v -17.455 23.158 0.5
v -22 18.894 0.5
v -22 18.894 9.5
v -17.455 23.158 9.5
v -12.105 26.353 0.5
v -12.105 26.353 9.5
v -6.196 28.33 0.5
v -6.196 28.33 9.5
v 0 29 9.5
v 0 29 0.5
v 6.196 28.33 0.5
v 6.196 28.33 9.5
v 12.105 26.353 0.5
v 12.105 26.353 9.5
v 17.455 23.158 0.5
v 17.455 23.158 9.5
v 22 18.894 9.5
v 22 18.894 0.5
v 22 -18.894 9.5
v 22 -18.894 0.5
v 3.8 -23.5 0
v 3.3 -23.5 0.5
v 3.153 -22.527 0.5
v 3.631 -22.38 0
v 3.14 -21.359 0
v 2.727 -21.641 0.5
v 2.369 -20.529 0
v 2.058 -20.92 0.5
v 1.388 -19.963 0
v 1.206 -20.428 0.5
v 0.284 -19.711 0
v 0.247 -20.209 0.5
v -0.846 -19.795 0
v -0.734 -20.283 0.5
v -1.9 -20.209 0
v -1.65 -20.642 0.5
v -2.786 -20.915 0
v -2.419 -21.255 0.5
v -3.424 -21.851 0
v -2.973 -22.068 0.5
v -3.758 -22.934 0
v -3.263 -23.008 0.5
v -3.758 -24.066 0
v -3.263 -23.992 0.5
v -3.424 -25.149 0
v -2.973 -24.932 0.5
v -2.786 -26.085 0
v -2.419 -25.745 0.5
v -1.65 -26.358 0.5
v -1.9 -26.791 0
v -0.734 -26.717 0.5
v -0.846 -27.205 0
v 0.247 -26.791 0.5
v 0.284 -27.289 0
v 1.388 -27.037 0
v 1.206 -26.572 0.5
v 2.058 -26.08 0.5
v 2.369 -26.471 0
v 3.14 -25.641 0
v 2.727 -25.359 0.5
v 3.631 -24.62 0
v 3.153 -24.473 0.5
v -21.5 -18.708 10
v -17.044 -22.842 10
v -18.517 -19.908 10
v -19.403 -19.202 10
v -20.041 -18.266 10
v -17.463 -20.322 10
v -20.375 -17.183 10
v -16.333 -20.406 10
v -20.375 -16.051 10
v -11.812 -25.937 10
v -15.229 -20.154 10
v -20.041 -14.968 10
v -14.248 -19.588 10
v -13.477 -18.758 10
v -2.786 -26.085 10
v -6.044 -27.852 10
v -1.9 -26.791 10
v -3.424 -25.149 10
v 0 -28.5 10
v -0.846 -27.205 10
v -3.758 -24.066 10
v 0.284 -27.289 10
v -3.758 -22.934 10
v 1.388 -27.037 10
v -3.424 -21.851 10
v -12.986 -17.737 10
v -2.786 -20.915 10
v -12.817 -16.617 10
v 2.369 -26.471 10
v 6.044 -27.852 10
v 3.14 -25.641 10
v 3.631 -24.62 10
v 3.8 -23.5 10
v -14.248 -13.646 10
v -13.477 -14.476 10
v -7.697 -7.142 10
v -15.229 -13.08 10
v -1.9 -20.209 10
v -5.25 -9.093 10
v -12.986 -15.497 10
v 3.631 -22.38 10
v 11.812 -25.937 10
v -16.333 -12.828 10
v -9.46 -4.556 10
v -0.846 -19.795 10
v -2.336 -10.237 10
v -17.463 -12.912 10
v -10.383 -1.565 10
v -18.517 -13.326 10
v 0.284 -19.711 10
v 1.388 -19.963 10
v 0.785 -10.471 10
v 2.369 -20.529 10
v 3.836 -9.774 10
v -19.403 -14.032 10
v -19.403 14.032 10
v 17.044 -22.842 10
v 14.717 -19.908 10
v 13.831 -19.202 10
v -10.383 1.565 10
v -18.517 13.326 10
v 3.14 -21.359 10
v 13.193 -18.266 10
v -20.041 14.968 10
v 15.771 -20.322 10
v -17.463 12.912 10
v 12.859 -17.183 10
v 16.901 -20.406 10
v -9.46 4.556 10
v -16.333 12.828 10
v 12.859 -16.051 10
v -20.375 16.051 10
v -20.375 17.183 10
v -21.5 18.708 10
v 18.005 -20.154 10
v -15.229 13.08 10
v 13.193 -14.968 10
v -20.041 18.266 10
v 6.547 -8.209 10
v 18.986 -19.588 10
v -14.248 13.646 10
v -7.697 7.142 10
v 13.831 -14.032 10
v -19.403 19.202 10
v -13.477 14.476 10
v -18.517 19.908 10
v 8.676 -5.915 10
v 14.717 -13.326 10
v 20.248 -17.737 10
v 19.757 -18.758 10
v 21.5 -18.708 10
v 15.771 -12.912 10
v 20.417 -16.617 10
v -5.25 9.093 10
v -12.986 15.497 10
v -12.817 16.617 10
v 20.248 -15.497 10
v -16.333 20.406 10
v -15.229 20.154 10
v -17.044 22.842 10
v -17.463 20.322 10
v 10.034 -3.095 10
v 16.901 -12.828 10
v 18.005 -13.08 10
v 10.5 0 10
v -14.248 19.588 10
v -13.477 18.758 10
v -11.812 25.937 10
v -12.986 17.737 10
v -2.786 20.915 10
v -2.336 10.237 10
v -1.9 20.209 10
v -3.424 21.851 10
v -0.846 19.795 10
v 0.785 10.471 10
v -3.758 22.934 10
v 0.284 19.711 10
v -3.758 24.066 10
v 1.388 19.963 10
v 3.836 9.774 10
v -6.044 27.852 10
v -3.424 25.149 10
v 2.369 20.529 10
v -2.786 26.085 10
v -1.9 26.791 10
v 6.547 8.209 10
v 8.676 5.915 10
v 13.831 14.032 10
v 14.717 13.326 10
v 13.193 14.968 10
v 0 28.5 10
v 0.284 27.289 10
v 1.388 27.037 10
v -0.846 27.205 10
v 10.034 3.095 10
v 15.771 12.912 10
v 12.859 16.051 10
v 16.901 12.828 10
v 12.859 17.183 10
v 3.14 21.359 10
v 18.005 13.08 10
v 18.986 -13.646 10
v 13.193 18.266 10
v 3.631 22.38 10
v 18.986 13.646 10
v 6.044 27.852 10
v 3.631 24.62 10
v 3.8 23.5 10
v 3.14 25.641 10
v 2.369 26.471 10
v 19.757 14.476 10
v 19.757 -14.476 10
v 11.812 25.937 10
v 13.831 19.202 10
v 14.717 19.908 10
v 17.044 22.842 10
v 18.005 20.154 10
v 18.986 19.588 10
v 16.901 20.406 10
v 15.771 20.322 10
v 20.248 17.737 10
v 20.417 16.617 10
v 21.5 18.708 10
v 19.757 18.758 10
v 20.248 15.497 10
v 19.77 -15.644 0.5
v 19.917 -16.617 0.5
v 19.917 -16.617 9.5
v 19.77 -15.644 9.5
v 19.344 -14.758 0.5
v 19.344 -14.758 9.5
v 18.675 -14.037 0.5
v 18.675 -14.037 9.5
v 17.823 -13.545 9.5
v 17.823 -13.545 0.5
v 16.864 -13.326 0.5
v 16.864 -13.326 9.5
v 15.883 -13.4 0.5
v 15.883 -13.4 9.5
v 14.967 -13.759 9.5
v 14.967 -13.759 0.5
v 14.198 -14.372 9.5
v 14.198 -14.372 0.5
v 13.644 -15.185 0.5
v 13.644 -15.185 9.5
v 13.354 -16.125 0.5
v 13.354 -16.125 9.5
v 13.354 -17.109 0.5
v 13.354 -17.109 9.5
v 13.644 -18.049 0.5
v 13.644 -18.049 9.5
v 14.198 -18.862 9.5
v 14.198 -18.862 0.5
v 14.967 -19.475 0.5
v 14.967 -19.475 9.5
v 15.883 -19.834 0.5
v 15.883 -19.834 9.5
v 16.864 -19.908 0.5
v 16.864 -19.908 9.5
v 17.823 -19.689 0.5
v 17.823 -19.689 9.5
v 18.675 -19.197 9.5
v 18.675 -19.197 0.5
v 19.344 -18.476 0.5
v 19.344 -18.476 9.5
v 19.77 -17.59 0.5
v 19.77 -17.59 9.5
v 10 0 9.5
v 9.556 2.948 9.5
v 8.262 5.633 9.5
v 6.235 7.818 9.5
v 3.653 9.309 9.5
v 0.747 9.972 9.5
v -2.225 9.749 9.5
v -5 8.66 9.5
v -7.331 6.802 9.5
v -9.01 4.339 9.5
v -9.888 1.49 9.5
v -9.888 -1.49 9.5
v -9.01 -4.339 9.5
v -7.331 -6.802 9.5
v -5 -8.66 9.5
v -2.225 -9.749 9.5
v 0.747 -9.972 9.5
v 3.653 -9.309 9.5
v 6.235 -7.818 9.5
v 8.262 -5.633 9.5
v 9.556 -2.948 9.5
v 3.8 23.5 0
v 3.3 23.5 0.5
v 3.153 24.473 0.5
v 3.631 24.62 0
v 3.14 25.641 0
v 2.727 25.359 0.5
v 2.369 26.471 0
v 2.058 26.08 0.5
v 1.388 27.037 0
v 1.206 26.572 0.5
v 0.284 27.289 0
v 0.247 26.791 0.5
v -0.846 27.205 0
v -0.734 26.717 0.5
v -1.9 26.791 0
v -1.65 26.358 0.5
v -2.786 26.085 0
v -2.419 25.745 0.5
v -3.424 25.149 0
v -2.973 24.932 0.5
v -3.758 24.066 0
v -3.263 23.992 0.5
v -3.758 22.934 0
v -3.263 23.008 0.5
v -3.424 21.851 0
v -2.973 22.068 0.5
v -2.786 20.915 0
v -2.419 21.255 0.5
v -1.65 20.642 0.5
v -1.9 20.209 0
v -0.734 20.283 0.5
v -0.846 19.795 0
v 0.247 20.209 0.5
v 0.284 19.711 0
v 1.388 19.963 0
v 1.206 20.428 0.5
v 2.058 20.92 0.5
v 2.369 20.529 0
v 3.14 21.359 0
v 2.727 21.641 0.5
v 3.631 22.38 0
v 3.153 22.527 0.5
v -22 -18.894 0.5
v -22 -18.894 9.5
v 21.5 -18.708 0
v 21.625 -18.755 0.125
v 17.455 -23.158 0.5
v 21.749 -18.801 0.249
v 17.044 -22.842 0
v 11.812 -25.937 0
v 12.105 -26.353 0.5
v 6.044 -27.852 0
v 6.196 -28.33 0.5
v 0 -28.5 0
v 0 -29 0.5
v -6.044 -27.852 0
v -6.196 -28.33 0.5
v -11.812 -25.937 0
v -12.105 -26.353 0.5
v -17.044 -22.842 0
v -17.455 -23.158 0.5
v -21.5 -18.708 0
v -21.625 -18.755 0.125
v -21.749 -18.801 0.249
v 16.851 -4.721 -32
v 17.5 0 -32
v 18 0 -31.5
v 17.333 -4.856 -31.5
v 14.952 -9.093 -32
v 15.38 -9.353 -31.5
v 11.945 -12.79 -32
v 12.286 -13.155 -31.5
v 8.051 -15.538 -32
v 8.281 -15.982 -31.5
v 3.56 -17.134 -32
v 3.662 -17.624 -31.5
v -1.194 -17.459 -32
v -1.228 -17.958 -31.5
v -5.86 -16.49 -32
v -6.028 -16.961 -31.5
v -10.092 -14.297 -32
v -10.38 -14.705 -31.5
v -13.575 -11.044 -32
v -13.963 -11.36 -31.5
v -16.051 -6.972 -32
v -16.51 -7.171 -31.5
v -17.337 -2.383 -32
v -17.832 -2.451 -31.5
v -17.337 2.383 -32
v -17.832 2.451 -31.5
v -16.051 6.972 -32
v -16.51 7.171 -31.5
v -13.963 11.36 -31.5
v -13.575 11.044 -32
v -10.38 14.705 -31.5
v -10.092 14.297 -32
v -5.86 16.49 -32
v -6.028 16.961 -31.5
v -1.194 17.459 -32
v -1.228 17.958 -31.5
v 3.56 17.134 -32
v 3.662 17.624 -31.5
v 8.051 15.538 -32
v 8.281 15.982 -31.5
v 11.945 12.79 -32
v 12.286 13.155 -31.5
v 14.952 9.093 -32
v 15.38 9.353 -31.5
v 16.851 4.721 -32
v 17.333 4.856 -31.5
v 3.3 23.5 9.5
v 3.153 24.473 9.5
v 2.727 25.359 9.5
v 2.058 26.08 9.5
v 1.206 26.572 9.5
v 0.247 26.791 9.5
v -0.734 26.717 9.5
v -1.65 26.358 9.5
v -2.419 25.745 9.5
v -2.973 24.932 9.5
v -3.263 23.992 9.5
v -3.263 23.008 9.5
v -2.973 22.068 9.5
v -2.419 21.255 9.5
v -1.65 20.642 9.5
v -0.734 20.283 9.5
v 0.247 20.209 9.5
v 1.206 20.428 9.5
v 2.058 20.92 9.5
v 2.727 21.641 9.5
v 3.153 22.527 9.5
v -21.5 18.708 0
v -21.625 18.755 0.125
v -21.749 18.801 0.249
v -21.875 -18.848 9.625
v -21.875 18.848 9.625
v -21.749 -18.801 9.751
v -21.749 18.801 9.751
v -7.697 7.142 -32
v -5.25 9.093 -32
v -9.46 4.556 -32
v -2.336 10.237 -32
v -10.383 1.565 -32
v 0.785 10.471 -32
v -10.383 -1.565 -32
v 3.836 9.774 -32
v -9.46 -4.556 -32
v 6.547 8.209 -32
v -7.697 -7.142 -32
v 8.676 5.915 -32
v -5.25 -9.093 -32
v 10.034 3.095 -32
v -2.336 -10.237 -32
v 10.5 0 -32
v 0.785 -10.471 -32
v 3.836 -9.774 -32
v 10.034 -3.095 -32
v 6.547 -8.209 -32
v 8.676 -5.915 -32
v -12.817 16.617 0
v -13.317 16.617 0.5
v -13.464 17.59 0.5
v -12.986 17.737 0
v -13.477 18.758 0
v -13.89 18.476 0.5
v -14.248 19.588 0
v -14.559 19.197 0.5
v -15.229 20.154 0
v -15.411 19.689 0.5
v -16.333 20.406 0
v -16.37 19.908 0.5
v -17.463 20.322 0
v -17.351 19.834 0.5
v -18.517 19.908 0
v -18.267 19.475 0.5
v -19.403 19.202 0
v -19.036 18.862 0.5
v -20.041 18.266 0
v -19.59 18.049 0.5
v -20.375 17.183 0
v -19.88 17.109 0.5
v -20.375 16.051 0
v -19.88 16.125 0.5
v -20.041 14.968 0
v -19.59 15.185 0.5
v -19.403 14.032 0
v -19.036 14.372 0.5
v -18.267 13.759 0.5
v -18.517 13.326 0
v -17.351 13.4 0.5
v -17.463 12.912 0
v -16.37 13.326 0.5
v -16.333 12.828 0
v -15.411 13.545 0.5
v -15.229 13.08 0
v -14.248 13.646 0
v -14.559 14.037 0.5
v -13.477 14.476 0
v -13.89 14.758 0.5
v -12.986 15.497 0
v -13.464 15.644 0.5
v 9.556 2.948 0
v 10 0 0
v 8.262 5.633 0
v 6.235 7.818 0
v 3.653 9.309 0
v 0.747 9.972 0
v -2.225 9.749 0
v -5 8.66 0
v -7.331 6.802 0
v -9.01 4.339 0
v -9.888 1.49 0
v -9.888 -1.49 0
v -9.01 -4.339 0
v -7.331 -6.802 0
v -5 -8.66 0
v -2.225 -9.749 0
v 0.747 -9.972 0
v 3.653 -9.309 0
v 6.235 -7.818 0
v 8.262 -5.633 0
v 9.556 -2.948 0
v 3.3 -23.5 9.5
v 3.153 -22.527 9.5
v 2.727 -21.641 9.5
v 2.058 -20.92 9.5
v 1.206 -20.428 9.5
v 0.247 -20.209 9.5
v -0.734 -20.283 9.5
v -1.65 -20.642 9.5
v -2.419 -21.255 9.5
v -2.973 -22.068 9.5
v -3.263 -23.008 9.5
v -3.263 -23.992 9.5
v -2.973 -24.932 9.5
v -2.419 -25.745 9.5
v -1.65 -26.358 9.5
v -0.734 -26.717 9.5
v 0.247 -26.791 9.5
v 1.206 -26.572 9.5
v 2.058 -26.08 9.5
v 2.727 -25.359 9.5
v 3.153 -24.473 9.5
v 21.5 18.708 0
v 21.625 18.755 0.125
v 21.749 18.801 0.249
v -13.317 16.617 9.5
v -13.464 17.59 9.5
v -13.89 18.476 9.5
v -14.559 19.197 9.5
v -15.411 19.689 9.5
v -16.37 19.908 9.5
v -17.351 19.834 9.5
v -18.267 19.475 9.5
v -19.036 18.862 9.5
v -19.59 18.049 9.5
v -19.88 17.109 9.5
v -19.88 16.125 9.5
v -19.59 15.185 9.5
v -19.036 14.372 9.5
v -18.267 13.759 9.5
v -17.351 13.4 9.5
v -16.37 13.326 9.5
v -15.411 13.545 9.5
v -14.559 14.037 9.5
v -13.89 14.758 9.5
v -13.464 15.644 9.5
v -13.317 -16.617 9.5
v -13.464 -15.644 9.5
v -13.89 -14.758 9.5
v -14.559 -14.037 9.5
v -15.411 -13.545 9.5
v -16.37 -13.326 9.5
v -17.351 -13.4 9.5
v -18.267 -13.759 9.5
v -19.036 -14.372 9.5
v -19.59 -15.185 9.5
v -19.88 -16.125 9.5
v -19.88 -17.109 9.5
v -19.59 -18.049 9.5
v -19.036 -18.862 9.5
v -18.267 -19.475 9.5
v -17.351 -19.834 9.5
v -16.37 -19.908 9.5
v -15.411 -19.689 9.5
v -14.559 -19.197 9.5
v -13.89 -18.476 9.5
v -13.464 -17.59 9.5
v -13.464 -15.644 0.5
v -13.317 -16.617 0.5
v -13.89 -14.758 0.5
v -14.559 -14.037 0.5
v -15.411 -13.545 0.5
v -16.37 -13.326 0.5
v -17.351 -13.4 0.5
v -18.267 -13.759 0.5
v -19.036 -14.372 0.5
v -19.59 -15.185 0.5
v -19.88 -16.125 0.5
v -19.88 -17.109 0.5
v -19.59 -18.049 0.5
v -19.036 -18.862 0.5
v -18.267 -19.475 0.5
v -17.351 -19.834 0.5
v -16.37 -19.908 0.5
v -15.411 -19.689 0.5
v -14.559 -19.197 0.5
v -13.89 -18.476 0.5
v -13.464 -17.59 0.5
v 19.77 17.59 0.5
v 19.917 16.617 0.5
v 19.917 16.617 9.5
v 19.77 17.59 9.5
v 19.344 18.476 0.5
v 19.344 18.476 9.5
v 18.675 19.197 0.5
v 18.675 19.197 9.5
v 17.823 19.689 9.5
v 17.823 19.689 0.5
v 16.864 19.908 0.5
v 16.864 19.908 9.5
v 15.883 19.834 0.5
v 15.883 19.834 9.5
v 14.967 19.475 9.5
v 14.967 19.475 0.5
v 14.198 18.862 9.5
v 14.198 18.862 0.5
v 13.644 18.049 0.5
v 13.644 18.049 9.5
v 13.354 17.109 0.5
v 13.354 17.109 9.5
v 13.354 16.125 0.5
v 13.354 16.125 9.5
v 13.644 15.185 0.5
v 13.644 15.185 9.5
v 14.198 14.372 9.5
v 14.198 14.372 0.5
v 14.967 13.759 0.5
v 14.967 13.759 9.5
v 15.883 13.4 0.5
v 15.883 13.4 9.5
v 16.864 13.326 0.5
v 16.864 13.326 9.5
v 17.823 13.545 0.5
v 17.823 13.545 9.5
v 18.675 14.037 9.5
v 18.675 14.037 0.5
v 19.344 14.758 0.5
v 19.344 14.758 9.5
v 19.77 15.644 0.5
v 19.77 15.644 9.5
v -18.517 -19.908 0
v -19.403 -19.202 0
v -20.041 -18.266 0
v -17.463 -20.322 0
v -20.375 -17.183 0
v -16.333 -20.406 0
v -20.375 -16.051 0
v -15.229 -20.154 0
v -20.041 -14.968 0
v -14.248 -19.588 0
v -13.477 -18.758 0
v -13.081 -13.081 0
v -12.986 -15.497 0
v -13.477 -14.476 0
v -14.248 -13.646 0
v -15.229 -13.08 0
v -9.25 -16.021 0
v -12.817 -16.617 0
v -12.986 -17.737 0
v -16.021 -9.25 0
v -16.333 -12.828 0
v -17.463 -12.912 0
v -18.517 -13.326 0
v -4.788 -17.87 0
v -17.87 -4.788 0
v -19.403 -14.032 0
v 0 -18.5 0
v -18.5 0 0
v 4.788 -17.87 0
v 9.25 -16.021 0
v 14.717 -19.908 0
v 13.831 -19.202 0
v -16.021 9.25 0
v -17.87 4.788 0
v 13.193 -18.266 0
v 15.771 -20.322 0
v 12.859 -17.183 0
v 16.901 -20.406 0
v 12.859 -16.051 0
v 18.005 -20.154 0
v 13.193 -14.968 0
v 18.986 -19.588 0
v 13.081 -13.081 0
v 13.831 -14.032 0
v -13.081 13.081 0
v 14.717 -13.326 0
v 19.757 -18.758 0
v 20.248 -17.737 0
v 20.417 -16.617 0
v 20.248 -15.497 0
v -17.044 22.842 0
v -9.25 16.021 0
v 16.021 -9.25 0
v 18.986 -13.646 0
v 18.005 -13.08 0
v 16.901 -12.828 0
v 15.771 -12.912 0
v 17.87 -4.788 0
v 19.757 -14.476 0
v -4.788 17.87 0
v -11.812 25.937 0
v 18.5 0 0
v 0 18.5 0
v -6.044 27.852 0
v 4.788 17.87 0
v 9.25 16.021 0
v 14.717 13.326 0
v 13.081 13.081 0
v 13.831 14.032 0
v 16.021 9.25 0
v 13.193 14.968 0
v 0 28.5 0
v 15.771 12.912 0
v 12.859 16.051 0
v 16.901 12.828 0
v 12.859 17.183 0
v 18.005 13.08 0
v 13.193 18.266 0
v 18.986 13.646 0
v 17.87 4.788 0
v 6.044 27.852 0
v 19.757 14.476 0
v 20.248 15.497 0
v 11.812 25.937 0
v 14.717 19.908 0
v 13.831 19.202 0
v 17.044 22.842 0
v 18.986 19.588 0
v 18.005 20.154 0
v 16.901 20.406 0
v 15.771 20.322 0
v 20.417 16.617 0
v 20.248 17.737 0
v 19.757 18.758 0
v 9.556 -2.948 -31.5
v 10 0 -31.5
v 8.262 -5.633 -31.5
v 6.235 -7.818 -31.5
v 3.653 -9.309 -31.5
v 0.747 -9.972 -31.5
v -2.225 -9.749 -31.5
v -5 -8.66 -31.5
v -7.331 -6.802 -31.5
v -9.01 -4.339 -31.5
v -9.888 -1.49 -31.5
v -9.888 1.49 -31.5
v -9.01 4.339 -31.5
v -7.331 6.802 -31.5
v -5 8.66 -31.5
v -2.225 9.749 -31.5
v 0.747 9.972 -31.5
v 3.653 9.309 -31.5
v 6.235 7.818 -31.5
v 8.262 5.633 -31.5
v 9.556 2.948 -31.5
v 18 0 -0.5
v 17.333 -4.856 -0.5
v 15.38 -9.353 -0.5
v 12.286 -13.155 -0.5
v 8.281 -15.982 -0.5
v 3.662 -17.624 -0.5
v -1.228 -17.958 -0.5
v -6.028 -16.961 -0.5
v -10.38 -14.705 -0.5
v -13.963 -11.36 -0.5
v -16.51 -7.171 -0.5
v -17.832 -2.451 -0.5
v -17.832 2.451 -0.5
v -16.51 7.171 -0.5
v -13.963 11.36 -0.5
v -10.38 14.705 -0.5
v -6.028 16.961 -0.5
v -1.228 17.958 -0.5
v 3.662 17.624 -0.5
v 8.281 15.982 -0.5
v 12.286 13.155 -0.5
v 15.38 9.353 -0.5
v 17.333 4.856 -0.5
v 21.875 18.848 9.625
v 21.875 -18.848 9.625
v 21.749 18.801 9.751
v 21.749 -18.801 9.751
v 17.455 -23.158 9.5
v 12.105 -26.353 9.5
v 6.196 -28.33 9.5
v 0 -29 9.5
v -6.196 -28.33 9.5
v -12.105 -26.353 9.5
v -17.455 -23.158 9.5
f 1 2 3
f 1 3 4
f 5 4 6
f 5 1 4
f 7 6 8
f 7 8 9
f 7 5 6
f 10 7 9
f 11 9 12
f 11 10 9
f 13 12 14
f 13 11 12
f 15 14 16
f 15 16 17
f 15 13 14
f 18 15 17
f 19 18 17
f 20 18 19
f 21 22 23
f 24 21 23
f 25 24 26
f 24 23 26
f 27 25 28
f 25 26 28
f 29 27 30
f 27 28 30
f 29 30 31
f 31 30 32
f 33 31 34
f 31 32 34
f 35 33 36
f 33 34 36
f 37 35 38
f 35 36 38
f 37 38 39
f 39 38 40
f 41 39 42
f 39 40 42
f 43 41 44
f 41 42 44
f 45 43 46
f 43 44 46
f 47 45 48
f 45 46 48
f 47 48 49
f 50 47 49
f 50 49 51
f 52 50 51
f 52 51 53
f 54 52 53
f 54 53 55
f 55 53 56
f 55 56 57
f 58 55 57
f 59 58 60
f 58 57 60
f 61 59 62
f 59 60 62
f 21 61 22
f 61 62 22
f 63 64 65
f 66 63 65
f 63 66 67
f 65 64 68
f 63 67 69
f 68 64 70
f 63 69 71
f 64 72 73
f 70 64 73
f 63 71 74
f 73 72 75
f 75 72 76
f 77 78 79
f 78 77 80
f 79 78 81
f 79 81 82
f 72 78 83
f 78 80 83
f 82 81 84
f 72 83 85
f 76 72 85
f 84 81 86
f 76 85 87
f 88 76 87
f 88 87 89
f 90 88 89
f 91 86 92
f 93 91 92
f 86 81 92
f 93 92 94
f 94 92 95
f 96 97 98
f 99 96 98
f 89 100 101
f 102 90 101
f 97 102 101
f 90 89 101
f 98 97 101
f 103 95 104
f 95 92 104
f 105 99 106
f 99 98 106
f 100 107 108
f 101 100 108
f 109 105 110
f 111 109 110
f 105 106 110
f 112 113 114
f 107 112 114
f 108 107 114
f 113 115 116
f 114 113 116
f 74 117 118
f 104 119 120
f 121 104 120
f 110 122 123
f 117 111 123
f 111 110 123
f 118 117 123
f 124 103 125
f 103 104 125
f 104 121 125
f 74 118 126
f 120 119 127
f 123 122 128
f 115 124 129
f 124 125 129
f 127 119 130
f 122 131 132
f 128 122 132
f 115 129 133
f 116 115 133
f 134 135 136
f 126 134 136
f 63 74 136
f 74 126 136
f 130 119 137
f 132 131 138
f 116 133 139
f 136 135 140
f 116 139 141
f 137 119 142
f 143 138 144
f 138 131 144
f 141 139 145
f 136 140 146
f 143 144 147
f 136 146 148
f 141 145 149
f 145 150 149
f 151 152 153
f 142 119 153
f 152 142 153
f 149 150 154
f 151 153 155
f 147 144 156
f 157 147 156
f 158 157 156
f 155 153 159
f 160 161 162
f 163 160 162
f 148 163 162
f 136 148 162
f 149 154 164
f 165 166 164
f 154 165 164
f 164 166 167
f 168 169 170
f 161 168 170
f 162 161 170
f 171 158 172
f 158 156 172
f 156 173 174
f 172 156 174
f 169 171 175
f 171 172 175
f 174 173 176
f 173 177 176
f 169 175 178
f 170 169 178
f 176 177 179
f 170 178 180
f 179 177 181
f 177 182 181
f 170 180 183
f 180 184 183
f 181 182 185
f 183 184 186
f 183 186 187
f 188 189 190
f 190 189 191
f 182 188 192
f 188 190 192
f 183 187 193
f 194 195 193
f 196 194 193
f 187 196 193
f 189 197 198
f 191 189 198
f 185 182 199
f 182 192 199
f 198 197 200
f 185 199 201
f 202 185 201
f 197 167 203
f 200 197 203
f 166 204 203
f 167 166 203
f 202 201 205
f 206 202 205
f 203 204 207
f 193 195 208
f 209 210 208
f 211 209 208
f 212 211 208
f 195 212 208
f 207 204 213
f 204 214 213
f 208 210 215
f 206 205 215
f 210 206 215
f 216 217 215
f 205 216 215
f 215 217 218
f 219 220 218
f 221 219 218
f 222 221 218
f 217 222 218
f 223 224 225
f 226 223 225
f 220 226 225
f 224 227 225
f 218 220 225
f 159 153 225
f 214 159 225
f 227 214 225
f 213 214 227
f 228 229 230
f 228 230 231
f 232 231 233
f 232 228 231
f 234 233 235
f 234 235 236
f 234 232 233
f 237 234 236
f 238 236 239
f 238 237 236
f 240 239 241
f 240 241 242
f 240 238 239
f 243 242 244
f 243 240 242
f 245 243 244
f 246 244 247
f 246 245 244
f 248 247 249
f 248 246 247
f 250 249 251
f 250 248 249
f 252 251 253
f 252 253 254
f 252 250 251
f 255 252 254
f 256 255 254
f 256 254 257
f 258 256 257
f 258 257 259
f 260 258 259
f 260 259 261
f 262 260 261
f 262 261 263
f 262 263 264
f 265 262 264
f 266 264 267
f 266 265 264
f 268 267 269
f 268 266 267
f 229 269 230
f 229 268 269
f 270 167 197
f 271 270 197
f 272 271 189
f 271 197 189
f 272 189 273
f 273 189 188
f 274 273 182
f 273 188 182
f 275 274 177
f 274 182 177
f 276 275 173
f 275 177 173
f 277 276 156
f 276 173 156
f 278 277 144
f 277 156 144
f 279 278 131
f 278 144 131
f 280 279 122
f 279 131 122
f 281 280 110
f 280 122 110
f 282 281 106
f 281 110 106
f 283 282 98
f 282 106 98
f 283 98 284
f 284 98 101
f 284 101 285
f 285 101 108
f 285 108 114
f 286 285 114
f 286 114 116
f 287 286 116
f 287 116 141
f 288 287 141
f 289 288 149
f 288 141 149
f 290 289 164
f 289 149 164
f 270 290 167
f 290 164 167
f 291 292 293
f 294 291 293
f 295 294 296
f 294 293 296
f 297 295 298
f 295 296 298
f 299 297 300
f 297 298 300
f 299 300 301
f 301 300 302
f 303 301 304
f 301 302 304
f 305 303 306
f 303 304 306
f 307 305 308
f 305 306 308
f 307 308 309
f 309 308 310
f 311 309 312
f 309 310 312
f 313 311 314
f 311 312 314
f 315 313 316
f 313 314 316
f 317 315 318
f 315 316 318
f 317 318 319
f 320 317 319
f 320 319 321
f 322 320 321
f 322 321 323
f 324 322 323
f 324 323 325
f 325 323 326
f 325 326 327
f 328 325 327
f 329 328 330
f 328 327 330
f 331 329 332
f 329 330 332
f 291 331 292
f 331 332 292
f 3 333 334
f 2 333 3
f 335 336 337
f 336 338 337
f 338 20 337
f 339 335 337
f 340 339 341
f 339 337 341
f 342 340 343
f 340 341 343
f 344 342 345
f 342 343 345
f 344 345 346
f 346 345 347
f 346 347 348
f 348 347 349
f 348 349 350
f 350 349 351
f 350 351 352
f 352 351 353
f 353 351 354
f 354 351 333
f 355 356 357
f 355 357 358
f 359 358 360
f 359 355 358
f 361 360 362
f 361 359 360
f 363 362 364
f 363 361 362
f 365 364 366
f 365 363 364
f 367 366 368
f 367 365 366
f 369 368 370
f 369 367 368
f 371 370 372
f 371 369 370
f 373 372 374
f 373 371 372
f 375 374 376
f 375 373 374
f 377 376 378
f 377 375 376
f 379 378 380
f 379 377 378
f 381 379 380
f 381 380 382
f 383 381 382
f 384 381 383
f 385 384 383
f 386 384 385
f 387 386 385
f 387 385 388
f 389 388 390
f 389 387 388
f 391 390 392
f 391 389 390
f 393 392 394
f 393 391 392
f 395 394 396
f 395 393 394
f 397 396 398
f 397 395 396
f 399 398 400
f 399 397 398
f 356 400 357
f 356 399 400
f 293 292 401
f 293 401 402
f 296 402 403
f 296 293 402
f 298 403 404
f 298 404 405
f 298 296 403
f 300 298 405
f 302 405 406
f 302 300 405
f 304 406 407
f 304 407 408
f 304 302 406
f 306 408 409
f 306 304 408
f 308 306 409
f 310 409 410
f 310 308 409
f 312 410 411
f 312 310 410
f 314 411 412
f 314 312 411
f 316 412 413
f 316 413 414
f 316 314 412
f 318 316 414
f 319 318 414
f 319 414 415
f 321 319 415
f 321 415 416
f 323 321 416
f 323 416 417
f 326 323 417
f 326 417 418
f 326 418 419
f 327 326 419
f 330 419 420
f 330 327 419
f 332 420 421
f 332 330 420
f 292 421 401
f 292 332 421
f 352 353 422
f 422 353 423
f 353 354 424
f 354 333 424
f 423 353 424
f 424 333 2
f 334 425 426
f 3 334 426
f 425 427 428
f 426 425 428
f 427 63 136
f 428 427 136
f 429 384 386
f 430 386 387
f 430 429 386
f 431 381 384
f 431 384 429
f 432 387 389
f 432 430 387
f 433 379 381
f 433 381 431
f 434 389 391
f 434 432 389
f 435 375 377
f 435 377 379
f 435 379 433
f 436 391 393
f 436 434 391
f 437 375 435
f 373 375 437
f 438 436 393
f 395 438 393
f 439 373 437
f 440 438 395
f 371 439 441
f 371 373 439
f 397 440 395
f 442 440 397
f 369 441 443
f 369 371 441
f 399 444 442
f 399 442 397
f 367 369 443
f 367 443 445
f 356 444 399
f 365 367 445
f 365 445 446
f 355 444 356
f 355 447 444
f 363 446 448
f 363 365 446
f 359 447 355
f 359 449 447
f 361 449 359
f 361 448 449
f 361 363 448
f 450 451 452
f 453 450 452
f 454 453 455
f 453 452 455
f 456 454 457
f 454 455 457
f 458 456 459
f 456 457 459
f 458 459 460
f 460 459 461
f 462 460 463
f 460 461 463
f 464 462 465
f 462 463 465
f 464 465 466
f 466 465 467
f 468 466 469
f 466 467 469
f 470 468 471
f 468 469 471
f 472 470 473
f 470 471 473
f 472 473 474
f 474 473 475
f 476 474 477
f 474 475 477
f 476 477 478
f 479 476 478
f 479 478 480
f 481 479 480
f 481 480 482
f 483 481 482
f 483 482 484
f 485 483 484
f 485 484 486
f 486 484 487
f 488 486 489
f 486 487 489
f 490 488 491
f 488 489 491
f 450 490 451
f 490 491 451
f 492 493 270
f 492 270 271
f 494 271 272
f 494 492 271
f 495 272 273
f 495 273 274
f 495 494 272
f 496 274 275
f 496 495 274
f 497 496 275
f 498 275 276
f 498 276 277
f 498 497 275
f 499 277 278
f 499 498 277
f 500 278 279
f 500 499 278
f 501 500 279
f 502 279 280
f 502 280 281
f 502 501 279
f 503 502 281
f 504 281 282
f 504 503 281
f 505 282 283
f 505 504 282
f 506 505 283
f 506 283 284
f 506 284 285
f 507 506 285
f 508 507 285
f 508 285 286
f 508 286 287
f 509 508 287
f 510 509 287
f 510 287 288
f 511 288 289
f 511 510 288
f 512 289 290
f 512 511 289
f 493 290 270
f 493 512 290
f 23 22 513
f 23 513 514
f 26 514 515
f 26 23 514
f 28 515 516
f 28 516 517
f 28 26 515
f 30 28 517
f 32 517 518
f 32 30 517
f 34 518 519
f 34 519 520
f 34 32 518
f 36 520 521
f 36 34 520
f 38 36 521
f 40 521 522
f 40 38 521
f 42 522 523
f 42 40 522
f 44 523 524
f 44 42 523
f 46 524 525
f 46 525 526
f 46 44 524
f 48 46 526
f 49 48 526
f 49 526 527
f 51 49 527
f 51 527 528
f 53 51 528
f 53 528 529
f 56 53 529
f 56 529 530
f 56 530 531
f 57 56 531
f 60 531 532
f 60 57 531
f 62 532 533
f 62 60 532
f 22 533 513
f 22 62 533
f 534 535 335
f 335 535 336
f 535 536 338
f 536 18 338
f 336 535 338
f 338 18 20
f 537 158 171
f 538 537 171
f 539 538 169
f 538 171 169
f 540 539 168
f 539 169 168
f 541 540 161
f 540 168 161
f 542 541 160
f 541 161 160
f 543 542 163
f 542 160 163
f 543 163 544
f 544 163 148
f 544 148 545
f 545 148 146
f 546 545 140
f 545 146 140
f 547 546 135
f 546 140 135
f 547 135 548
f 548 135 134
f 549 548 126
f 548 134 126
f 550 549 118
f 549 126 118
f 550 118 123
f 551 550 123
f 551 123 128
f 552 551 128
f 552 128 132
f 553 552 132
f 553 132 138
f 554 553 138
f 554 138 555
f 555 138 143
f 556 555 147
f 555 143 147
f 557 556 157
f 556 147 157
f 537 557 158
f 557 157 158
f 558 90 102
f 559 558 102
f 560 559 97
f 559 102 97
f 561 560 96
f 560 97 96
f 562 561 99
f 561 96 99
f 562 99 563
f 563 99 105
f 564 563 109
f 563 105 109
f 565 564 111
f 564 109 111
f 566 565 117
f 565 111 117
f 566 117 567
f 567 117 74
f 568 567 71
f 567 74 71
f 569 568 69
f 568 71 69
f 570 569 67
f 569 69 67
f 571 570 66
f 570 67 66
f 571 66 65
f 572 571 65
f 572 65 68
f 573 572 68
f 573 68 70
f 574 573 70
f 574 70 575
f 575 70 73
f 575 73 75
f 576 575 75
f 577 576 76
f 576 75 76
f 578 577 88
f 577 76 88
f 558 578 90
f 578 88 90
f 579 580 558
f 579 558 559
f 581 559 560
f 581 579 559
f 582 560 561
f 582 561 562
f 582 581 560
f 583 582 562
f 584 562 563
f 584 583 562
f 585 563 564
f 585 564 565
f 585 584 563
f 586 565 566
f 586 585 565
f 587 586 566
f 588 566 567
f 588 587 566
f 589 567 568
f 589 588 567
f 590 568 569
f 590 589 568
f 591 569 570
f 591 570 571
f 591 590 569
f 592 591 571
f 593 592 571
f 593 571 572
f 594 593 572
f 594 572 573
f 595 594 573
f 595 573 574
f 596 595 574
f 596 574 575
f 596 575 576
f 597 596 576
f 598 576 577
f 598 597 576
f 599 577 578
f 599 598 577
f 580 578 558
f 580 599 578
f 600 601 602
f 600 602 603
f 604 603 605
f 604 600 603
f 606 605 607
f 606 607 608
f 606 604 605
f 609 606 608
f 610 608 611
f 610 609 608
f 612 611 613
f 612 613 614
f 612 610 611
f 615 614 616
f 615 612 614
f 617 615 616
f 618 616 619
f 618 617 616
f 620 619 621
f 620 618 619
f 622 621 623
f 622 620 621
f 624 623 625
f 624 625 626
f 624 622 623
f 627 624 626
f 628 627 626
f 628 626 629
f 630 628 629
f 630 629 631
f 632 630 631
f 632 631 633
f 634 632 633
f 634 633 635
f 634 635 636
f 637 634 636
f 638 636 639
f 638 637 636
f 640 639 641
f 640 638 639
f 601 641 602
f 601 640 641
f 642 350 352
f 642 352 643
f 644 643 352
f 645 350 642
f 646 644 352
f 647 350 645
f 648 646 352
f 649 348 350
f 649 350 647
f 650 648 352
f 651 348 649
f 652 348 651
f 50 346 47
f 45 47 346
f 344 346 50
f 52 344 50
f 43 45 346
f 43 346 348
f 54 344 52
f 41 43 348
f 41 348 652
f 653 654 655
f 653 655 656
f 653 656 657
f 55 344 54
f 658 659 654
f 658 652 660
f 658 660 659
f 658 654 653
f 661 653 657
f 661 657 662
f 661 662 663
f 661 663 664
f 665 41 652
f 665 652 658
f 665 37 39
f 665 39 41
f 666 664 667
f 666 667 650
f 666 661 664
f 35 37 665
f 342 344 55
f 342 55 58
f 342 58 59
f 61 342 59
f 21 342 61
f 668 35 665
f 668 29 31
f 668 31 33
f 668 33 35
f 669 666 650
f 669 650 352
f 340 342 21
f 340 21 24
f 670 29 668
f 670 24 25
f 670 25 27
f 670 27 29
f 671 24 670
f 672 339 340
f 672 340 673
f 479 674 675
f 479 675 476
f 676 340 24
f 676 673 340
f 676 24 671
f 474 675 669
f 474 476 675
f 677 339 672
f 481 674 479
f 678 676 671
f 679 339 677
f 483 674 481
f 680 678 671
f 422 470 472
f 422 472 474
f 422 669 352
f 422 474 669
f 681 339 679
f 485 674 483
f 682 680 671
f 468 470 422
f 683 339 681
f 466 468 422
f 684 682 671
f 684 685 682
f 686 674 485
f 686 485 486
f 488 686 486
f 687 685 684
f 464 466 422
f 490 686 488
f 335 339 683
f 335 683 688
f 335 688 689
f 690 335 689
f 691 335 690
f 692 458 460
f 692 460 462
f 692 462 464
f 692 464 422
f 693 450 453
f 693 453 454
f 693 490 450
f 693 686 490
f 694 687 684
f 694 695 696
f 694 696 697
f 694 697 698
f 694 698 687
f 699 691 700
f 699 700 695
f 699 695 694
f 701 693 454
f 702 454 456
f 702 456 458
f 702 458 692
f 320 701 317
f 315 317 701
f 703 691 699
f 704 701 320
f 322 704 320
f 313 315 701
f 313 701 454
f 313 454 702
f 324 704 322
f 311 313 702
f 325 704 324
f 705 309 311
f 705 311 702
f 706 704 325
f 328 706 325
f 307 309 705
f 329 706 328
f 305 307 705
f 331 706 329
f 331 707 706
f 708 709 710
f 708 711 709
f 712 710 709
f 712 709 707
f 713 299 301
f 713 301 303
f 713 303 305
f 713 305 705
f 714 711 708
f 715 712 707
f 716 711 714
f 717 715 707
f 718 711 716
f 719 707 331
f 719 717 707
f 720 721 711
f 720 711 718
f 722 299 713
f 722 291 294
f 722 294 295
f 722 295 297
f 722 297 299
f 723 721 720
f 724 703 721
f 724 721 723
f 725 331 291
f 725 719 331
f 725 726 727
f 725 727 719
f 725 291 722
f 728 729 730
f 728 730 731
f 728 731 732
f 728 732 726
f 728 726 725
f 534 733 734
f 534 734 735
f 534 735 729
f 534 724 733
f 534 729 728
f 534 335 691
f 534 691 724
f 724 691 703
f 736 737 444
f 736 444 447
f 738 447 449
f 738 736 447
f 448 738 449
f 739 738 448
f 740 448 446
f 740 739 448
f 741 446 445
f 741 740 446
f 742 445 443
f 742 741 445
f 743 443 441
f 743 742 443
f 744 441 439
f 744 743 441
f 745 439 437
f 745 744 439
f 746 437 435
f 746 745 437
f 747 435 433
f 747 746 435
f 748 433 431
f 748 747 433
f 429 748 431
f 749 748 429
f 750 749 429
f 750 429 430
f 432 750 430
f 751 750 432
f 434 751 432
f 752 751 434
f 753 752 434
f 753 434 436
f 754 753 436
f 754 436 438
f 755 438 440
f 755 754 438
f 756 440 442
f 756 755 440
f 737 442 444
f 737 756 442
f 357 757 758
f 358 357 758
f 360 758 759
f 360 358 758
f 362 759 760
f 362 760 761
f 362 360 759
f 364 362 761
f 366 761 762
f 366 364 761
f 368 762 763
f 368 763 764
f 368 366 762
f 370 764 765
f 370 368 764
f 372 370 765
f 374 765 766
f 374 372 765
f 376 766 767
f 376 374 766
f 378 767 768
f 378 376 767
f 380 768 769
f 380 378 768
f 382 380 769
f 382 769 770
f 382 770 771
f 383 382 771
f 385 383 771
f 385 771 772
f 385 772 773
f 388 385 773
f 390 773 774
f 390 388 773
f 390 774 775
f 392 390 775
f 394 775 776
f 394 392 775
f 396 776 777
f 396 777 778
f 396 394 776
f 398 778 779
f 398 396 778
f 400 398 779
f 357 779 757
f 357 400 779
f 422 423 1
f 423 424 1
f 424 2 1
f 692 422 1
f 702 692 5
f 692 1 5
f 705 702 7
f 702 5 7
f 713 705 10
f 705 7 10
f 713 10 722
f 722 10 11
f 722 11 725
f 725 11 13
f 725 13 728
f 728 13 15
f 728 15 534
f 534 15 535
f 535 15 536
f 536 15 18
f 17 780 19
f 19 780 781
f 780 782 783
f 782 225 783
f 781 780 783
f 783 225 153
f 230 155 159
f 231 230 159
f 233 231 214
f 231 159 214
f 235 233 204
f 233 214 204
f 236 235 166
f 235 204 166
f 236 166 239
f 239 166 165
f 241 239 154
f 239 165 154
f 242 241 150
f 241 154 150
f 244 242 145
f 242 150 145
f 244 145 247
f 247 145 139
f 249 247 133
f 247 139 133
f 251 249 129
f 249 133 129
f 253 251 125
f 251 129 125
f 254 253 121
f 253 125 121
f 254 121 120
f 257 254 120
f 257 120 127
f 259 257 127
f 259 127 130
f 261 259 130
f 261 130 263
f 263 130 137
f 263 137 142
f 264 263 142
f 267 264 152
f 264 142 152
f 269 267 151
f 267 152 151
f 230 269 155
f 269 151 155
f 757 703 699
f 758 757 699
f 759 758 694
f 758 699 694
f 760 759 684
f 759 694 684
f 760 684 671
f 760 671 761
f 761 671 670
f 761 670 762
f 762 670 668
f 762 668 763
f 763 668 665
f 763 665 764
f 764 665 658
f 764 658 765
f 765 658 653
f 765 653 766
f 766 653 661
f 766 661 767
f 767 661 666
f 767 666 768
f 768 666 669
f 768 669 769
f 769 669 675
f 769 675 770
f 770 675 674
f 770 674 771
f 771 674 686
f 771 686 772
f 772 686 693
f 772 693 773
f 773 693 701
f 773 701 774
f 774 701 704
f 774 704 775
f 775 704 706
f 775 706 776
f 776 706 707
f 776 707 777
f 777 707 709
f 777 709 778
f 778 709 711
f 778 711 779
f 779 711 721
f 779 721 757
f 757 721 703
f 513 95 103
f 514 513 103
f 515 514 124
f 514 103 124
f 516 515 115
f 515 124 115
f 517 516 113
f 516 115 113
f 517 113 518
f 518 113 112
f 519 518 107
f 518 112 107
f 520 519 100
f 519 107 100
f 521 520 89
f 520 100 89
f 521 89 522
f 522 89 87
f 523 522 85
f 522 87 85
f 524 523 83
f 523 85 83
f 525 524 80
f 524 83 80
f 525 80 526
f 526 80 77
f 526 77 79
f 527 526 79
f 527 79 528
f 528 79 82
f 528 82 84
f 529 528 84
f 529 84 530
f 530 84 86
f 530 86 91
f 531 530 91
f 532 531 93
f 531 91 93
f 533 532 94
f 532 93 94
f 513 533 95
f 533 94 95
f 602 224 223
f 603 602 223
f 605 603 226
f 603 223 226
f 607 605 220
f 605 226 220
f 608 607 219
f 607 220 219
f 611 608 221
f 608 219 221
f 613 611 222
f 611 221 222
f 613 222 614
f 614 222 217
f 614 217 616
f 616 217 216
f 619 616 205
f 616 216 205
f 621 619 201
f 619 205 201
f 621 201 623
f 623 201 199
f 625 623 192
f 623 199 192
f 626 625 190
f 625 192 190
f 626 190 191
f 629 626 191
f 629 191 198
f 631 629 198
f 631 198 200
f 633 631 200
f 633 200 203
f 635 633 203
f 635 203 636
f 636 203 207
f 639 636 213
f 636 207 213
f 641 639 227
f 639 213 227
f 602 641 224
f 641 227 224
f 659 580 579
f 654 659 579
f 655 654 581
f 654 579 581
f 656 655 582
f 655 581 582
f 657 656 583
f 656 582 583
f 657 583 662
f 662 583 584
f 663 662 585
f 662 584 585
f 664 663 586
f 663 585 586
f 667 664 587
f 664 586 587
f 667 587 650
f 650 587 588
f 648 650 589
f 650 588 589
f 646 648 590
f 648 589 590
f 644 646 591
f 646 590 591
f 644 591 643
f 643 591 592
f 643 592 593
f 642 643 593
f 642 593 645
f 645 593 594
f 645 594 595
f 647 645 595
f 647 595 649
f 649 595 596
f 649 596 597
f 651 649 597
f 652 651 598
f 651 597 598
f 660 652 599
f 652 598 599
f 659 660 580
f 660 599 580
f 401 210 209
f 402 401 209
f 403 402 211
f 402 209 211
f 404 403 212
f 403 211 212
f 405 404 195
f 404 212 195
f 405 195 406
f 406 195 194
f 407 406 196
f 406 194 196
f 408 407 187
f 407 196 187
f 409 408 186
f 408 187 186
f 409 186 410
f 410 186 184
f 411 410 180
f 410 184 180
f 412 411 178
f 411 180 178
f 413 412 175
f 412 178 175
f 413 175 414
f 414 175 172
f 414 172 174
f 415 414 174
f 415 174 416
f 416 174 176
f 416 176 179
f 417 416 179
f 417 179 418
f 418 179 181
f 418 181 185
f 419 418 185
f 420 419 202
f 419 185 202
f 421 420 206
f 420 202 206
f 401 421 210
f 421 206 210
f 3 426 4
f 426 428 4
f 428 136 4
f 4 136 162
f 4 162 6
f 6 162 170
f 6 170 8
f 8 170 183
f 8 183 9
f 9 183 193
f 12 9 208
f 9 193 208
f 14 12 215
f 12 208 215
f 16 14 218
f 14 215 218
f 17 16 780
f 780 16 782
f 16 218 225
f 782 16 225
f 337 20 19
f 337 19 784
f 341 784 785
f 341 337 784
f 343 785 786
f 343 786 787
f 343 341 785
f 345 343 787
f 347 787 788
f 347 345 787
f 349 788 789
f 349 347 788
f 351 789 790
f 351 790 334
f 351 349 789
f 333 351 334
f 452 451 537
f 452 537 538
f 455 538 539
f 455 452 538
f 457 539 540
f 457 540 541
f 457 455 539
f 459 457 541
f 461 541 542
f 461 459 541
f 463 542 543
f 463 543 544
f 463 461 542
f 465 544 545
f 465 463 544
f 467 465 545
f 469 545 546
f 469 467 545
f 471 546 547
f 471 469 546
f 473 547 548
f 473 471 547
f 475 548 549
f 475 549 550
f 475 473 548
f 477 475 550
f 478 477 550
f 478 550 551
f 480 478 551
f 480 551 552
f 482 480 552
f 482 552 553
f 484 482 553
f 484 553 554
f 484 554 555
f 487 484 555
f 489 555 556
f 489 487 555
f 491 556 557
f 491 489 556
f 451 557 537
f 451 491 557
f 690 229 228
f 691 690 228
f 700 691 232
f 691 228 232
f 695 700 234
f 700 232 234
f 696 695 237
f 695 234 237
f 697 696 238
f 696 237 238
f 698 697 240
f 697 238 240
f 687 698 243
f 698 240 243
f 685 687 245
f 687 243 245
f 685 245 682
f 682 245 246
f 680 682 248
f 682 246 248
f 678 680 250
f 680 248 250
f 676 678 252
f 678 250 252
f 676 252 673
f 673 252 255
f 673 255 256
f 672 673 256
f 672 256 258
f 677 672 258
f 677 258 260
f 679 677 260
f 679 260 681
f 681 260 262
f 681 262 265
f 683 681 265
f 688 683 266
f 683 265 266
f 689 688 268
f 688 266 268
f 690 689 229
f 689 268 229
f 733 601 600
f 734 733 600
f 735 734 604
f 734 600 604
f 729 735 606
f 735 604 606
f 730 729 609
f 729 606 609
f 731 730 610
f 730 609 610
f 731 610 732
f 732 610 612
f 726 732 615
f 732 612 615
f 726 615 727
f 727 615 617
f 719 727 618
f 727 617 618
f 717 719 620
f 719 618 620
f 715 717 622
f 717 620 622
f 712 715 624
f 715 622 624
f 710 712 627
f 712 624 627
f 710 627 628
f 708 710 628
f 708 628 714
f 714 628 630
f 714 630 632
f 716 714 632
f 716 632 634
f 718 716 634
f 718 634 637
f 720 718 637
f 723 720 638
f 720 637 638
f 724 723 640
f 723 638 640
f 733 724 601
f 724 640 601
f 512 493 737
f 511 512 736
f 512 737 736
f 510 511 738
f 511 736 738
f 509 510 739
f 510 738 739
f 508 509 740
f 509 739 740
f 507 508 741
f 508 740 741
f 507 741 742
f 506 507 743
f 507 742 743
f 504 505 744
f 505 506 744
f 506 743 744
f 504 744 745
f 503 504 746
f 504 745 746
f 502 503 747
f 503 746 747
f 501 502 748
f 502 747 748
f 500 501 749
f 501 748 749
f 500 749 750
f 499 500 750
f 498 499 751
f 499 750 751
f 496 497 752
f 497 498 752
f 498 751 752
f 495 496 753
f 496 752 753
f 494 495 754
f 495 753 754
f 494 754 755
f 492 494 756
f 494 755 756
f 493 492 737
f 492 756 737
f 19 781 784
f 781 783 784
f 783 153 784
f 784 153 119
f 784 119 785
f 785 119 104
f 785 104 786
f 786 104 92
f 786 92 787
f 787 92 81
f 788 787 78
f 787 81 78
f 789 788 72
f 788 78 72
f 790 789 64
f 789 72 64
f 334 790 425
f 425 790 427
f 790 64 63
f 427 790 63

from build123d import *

# Parameters (mm, degrees)
SKETCH1_R           = 10
SKETCH1_R_2         = 3.3
BOSS_EXTRUDE1_DEPTH = 10
BOSS_EXTRUDE2_START = 32
SKETCH3_R           = 18
SKETCH3_R_2         = 10
BOSS_EXTRUDE2_DEPTH = 32
CHAMFER1_SIZE       = 0.5


with BuildPart() as part:
    # Sketch1 → Boss-Extrude1 (new body)
    with BuildSketch(Plane(origin=(0, 0, 0), x_dir=(0, -1, 0), z_dir=(0, 0, 1))):
        with BuildLine():
            Line((-18.894443628, 22), (18.894443628, 22))
            ThreePointArc((18.894443628, 22), (29, 0), (18.894443628, -22))
            Line((18.894443628, -22), (-18.894443628, -22))
            ThreePointArc((-18.894443628, -22), (-29, 0), (-18.894443628, 22))
        make_face()
        with Locations(Location((0, 0, 0), (0, 0, 90))):
            Circle(SKETCH1_R, mode=Mode.SUBTRACT)
        with Locations(Location((-23.5, 0, 0), (0, 0, 90))):
            Circle(SKETCH1_R_2, mode=Mode.SUBTRACT)
        with Locations(Location((-16.617009358, 16.617009358, 0), (0, 0, 90))):
            Circle(SKETCH1_R_2, mode=Mode.SUBTRACT)
        with Locations(Location((16.617009358, 16.617009358, 0), (0, 0, 90))):
            Circle(SKETCH1_R_2, mode=Mode.SUBTRACT)
        with Locations(Location((23.5, 0, 0), (0, 0, 90))):
            Circle(SKETCH1_R_2, mode=Mode.SUBTRACT)
        with Locations(Location((16.617009358, -16.617009358, 0), (0, 0, 90))):
            Circle(SKETCH1_R_2, mode=Mode.SUBTRACT)
        with Locations(Location((-16.617009358, -16.617009358, 0), (0, 0, 90))):
            Circle(SKETCH1_R_2, mode=Mode.SUBTRACT)
    extrude(amount=BOSS_EXTRUDE1_DEPTH)

    # Sketch3 → Boss-Extrude2 (add)
    with BuildSketch(Plane(origin=(0, 0, 0), x_dir=(0, -1, 0), z_dir=(0, 0, -1)).offset(BOSS_EXTRUDE2_START)):
        with Locations(Location((0, 0, 0), (0, 0, 270))):
            Circle(SKETCH3_R)
        with Locations(Location((0, 0, 0), (0, 0, 270))):
            Circle(SKETCH3_R_2, mode=Mode.SUBTRACT)
    extrude(amount=-BOSS_EXTRUDE2_DEPTH)

    # Chamfer1
    chamfer1_edges = [part.edges().sort_by_distance(p)[0] for p in [
        (0, 29, 10),
        (-10, 0, 10),
        (-22, 0, 10),
        (-3.3, 23.5, 0),
        (-3.3, 23.5, 10),
        (13.317009358, 16.617009358, 0),
        (13.317009358, 16.617009358, 10),
        (13.317009358, -16.617009358, 0),
        (13.317009358, -16.617009358, 10),
        (-3.3, -23.5, 0),
        (-3.3, -23.5, 10),
        (-19.917009358, -16.617009358, 0),
        (-19.917009358, -16.617009358, 10),
        (-19.917009358, 16.617009358, 0),
        (-19.917009358, 16.617009358, 10),
        (0, -29, 10),
        (-18, 0, 0),
        (-18, 0, -32),
        (-10, 0, -32),
        (-22, 0, 0),
        (0, 29, 0),
        (22, 0, 0),
        (0, -29, 0),
        (22, 0, 10),
    ]]
    chamfer(chamfer1_edges, length=CHAMFER1_SIZE)


solid = part.part
